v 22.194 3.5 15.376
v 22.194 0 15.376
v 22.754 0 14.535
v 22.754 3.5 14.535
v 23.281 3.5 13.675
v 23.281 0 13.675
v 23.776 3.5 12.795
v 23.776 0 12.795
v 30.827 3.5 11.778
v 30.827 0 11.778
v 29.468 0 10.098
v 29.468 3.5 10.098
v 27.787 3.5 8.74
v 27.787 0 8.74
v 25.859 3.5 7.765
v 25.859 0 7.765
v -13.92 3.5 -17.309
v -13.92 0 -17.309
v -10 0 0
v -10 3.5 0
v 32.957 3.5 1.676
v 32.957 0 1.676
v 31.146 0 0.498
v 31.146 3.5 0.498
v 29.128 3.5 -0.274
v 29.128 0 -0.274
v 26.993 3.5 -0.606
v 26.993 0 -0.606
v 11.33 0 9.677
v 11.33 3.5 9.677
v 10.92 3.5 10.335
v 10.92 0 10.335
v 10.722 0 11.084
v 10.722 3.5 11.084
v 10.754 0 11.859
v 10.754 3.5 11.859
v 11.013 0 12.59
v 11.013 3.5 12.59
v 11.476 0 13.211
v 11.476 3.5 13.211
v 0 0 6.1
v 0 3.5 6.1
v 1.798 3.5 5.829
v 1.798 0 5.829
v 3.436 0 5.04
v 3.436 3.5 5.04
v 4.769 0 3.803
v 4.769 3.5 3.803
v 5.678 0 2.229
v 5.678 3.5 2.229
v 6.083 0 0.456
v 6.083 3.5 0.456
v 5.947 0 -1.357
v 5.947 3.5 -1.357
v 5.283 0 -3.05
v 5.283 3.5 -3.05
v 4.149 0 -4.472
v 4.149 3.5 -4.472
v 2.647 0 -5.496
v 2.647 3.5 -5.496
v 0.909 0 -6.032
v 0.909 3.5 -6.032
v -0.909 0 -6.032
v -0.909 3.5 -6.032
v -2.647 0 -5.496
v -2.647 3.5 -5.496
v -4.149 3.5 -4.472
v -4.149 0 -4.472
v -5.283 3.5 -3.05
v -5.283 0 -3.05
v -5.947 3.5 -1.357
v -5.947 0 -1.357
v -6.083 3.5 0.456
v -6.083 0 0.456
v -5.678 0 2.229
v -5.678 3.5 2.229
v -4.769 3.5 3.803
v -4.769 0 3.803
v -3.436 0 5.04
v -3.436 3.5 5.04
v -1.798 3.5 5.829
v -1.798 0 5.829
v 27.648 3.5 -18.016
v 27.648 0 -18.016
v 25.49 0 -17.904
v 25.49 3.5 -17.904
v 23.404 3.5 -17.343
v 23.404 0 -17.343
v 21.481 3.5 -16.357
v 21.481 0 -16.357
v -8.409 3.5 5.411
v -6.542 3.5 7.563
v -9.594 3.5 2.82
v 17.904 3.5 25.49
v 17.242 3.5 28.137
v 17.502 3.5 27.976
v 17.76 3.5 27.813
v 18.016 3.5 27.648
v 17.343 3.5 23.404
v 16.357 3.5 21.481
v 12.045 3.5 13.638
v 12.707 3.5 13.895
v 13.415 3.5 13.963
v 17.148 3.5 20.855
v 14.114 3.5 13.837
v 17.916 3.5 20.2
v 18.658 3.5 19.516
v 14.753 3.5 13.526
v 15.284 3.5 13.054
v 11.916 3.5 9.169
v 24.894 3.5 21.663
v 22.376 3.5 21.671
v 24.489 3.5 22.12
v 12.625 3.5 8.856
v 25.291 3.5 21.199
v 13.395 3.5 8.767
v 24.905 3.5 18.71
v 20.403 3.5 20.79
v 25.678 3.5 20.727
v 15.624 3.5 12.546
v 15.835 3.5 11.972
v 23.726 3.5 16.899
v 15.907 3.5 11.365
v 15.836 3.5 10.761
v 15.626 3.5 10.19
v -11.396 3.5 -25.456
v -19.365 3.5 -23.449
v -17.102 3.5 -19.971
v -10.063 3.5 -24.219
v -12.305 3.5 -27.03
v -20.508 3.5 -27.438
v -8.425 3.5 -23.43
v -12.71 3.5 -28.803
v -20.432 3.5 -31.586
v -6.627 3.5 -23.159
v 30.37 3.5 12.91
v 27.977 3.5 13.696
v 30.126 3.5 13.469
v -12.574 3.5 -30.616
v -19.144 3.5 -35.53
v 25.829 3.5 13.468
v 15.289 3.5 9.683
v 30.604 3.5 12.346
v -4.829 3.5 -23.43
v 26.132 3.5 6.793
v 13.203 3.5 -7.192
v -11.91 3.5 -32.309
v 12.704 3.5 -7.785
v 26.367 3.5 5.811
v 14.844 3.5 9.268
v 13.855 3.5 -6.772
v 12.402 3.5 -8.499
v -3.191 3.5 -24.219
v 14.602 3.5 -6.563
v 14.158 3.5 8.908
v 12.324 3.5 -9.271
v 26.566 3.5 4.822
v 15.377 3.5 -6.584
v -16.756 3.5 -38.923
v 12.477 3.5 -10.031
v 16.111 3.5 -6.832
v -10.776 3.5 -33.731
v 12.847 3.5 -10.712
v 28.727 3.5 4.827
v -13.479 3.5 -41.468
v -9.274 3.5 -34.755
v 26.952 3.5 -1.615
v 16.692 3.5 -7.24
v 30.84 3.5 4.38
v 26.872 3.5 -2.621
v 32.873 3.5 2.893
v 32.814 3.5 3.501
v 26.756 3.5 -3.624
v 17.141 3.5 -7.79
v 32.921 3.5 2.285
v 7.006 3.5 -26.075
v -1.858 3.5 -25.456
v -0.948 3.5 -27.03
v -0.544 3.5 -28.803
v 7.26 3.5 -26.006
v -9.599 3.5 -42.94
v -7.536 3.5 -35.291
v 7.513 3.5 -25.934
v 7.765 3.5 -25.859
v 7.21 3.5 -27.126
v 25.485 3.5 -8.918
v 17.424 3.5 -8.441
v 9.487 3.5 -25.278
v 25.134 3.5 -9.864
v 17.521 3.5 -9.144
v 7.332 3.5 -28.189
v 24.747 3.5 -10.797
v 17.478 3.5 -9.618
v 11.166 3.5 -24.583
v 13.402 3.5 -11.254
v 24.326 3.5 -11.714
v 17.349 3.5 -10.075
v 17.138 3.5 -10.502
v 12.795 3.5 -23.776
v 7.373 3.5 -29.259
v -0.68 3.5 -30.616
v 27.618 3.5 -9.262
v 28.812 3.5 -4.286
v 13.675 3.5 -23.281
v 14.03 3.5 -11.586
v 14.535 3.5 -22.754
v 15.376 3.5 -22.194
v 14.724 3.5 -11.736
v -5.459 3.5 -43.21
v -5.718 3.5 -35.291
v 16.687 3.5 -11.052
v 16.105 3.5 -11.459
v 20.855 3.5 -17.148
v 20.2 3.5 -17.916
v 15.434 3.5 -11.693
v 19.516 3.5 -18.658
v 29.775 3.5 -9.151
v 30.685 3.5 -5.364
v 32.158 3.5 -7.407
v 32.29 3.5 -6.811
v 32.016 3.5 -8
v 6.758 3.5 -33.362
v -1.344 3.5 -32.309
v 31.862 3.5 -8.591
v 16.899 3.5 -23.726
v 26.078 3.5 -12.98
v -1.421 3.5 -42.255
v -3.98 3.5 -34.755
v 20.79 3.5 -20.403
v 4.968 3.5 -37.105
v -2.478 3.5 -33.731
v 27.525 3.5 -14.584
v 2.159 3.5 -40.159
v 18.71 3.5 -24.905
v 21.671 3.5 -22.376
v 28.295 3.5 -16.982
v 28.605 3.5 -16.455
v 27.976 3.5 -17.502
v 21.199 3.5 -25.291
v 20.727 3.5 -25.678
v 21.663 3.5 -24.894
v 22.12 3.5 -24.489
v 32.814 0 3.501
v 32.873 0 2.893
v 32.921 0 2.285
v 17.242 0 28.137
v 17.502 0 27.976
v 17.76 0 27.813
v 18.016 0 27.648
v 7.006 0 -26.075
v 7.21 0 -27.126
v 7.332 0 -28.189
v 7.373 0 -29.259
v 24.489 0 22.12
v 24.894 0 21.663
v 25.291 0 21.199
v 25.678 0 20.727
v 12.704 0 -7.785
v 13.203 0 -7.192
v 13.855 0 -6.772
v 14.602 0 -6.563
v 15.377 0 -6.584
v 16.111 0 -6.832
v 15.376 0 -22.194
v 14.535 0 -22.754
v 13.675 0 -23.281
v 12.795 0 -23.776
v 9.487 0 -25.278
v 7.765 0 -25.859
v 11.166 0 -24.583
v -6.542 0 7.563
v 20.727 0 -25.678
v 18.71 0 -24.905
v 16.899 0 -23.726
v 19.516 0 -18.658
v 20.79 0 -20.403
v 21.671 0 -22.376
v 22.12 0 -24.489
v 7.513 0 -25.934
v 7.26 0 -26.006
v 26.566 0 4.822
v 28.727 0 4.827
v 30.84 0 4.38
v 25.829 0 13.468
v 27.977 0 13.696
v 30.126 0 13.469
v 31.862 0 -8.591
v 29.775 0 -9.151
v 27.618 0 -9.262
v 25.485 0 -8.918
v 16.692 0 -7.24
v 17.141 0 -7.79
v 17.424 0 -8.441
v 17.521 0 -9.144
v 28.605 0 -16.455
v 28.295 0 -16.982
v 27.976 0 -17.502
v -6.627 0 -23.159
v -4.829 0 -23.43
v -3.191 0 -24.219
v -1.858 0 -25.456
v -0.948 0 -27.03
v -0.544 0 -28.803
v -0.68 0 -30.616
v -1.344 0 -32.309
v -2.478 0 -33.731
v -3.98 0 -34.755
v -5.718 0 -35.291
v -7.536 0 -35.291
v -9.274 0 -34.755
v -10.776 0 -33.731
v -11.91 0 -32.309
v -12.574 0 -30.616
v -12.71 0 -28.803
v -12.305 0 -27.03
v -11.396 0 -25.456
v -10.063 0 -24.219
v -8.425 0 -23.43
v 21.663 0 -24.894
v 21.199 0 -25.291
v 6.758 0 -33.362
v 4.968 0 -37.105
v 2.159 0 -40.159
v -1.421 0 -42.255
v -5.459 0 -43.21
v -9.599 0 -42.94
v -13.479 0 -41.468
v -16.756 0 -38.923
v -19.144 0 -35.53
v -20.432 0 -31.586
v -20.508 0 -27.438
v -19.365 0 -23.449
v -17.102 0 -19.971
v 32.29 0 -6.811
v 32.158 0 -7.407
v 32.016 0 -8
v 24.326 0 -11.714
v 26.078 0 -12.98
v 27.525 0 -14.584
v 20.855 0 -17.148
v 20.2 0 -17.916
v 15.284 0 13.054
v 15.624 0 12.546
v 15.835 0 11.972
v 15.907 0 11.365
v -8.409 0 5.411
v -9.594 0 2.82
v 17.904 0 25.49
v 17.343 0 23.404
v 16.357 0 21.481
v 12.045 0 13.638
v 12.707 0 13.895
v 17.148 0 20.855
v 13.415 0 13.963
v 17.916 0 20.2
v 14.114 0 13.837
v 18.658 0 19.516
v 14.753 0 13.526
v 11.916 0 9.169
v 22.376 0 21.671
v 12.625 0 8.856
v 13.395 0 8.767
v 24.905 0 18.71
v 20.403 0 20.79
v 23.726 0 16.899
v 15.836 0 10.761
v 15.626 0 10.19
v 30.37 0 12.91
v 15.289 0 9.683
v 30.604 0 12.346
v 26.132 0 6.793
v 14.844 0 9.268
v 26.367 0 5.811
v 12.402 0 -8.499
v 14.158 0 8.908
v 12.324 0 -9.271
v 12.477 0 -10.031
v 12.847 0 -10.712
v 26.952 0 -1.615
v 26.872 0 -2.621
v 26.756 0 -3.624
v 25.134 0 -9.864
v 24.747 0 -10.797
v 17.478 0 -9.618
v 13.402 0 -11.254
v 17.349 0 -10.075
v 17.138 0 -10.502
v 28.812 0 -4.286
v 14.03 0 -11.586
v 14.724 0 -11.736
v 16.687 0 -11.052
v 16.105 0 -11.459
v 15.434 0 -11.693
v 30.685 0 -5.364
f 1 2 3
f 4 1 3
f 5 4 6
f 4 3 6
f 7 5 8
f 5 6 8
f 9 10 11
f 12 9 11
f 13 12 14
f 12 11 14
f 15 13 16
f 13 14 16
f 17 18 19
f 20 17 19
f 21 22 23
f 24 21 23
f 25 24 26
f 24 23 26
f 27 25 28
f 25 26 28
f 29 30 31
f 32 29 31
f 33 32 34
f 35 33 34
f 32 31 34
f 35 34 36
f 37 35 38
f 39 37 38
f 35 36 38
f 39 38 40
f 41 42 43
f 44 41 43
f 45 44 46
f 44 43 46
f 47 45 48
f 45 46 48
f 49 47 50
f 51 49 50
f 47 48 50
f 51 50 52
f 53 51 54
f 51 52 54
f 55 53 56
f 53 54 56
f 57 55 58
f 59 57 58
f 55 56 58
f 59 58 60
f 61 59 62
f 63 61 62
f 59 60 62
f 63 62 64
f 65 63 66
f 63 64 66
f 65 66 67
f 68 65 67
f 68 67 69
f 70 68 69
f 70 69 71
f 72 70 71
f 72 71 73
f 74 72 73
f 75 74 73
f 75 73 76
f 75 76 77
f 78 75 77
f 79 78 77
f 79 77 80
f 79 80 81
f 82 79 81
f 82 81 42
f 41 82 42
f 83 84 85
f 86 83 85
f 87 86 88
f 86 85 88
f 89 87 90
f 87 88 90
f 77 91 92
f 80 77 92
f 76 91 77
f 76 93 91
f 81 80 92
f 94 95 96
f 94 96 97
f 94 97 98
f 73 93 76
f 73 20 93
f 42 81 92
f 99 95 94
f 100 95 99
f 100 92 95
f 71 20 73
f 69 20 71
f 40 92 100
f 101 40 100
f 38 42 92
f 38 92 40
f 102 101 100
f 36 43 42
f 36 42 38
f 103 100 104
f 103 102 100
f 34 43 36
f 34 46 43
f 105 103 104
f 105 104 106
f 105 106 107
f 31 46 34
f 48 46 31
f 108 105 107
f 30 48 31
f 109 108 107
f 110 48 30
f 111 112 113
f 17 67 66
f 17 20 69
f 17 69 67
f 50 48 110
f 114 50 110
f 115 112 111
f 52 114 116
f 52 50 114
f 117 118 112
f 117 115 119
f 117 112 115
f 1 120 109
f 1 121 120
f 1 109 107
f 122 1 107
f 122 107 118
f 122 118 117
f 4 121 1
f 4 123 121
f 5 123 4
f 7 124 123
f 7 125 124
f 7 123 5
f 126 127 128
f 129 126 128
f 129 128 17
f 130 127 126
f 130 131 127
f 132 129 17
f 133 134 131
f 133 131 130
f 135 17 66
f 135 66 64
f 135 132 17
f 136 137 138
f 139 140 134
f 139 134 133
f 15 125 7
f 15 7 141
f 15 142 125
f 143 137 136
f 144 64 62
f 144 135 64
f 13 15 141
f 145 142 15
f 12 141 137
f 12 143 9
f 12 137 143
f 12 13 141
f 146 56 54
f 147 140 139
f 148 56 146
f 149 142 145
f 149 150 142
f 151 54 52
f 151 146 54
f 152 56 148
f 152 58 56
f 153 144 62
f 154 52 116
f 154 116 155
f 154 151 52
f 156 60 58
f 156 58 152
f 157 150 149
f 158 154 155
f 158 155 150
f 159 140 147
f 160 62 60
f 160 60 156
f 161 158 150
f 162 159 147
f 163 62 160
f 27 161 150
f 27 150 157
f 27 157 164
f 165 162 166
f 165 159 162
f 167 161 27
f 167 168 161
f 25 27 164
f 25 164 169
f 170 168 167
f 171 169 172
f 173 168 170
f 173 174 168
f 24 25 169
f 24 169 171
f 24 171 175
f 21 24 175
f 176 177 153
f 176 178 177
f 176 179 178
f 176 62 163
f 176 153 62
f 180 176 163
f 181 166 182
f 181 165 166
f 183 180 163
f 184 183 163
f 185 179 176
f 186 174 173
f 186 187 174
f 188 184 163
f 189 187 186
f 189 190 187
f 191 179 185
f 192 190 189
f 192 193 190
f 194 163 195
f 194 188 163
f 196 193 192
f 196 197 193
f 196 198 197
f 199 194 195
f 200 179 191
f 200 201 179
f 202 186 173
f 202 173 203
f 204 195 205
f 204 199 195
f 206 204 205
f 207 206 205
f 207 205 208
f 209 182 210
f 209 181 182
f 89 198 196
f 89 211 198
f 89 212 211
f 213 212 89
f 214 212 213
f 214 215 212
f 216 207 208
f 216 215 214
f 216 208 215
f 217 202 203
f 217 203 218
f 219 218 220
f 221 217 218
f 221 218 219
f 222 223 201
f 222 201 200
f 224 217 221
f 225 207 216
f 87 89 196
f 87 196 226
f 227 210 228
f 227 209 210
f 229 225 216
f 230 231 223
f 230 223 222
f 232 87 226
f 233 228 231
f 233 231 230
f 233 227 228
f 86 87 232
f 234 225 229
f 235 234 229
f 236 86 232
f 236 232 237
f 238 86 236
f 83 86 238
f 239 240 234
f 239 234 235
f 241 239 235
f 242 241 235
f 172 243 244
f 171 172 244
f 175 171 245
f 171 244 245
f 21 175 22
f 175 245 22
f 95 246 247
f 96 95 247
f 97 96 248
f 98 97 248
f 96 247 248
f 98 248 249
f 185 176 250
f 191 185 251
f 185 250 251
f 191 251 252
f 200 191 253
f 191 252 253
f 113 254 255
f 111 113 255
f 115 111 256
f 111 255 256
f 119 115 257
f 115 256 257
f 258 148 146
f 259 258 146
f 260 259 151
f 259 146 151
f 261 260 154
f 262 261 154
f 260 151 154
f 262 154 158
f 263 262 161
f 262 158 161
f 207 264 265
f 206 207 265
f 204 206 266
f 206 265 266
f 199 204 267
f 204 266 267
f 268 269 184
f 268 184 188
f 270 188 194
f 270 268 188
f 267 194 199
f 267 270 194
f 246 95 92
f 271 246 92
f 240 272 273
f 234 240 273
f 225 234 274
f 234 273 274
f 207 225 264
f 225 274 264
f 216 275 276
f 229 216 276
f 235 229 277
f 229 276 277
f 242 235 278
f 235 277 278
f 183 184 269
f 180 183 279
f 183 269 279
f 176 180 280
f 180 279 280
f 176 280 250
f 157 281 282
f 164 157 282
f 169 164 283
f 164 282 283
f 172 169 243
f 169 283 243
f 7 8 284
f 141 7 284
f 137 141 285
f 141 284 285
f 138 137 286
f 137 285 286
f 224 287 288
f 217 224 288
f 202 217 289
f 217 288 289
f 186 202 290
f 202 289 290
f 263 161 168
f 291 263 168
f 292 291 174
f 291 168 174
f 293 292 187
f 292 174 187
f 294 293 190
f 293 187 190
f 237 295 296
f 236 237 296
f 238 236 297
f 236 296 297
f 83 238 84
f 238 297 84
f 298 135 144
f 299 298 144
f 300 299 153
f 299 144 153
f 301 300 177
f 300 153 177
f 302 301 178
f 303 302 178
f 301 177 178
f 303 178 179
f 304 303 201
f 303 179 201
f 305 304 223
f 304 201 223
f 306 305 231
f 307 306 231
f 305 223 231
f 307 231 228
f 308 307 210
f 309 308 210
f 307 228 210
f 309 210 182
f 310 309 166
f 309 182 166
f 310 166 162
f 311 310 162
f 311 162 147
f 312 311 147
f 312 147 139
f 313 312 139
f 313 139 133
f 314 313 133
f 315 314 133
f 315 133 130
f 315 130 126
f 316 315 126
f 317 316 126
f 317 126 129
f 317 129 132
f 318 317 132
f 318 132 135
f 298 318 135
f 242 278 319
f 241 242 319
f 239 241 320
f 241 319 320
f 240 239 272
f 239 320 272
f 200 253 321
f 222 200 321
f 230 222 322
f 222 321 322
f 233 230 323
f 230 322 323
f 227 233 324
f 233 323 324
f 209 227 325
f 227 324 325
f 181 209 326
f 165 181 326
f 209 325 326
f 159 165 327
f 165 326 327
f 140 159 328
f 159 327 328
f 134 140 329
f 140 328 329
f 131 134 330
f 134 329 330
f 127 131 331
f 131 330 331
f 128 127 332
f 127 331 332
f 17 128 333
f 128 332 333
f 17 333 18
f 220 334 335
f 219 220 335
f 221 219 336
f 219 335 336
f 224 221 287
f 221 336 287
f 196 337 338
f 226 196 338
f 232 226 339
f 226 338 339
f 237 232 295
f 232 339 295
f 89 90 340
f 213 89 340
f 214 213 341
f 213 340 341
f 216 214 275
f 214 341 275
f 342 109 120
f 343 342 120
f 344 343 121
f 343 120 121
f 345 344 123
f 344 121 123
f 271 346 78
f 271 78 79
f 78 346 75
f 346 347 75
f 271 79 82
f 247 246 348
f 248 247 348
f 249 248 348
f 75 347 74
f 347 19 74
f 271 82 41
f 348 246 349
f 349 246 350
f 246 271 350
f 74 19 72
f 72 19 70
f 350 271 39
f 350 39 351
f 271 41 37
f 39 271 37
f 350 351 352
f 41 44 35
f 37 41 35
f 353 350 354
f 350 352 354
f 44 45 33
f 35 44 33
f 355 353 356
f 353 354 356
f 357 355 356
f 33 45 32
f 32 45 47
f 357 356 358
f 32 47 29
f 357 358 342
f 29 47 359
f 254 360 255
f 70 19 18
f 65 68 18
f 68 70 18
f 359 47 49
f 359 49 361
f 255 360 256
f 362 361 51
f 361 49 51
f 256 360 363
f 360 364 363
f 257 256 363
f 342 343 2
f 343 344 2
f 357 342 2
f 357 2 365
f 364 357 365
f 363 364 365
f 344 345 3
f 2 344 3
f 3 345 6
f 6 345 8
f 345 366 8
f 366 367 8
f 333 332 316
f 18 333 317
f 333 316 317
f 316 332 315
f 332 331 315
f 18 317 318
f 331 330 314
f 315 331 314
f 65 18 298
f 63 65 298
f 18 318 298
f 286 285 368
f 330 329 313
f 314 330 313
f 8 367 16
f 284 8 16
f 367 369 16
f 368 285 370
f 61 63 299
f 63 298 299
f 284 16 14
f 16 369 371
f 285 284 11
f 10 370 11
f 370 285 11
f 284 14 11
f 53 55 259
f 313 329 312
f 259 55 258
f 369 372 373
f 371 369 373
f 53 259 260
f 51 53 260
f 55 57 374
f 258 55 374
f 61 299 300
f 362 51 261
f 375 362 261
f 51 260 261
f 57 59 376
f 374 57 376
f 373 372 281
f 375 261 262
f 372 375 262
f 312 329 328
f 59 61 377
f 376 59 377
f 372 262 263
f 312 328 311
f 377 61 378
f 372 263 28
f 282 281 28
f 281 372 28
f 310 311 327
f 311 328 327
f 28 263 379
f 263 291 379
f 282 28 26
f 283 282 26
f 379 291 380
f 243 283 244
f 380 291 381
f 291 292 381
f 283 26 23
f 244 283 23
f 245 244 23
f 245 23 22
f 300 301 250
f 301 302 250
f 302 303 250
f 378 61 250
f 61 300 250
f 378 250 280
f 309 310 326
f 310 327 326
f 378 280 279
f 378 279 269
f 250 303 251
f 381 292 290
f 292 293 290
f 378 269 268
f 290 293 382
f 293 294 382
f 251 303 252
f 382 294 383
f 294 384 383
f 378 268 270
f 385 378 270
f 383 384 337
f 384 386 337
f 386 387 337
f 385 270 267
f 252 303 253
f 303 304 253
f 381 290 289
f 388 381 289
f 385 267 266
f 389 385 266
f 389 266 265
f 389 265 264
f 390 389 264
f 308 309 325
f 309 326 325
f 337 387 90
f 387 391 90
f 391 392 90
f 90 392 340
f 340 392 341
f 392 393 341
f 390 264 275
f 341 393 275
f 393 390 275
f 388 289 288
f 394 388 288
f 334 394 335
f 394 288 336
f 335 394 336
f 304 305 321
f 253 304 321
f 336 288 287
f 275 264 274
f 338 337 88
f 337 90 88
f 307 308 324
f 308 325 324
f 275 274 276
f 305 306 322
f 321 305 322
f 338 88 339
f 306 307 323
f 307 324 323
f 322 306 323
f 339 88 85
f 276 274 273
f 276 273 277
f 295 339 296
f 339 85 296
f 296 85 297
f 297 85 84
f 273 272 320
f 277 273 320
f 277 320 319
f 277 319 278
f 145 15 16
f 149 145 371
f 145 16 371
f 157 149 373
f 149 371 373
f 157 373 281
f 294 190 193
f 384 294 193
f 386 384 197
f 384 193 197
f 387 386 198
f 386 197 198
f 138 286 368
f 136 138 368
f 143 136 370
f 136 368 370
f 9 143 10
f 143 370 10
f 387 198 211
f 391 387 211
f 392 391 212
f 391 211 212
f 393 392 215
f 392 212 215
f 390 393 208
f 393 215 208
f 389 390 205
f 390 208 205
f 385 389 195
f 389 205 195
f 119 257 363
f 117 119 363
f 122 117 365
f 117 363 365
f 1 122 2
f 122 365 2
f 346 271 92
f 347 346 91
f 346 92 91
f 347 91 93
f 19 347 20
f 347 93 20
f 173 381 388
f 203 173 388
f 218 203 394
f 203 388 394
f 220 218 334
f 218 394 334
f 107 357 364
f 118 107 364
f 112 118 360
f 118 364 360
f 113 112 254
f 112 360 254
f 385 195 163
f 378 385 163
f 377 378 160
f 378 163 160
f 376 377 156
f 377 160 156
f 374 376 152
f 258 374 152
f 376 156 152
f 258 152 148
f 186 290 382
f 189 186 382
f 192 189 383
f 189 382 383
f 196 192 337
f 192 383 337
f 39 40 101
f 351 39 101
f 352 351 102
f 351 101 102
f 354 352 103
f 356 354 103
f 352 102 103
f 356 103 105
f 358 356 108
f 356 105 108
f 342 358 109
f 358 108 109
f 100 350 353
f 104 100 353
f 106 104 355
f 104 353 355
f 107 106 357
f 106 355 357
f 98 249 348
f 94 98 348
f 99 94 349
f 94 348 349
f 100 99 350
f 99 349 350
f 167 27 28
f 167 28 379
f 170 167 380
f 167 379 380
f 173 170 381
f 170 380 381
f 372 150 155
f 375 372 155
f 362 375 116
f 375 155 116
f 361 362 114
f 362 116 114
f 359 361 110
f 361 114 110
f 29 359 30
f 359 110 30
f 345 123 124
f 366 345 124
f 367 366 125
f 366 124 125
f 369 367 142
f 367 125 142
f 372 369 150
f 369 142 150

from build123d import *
from build123d.topology import SkipClean

# Parameters (mm, degrees)
SKETCH_1_R           = 27
EXTRUDE_2_DEPTH      = 10
EXTRUDE_START        = -10
EXTRUDE_3_DEPTH      = 10
CUT_EXTRUDE_2_DEPTH  = 48.669538272
SKETCH_6_R           = 6.1
CUT_EXTRUDE_3_DEPTH  = 10
EXTRUDE_5_DEPTH      = 10
SKETCH_10_R          = 6.1
CUT_EXTRUDE_5_DEPTH  = 10
CUT_EXTRUDE_START    = -10
CUT_EXTRUDE_6_DEPTH  = 10
FILLET_1_R           = 10
EXTRUDE_7_DEPTH      = 10
CUT_EXTRUDE_START_2  = -6.5
CUT_EXTRUDE_8_DEPTH  = 6.5
CUT_EXTRUDE_9_DEPTH  = 10
CUT_EXTRUDE_10_DEPTH = 10


with BuildPart() as part:
    # 草图1 → 凸台-拉伸2 (new body)
    with BuildSketch(Plane(origin=(0, 0, 0), x_dir=(1, 0, 0), z_dir=(0, 1, 0))):
        with Locations(Location((0, 0, 0), (0, 0, 270))):
            Circle(SKETCH_1_R)
    extrude(amount=EXTRUDE_2_DEPTH)

    # 草图3 → 凸台-拉伸3 (add)
    with BuildSketch(Plane(origin=(0, 10, 0), x_dir=(1, 0, 0), z_dir=(0, 1, 0)).offset(EXTRUDE_START)):
        with BuildLine():
            ThreePointArc((-3.623654542, 26.755730746), (-4.775668185, 29.776890365), (-6.810627033, 32.289554959))
            ThreePointArc((-6.810627033, 32.289554959), (-7.703697007, 32.088207373), (-8.590838072, 31.862164101))
            ThreePointArc((-8.590838072, 31.862164101), (-9.263273827, 28.699511571), (-8.918147734, 25.484635391))
            ThreePointArc((-8.918147734, 25.484635391), (-6.303024824, 26.253987851), (-3.623654542, 26.755730746))
        make_face()
        with BuildLine():
            ThreePointArc((-11.714275763, 24.326441239), (-13.743495509, 26.843742988), (-16.455312443, 28.604592156))
            ThreePointArc((-16.455312443, 28.604592156), (-17.242452636, 28.137125424), (-18.016322714, 27.648003832))
            ThreePointArc((-18.016322714, 27.648003832), (-17.678533741, 24.432348458), (-16.356847947, 21.481469346))
            ThreePointArc((-16.356847947, 21.481469346), (-14.107461247, 23.021284438), (-11.714275763, 24.326441239))
        make_face()
        with BuildLine():
            ThreePointArc((-18.658222053, 19.515910171), (-21.366013737, 21.282943016), (-24.48923722, 22.119612574))
            ThreePointArc((-24.48923722, 22.119612574), (-25.093396865, 21.431785595), (-25.678244161, 20.727464312))
            ThreePointArc((-25.678244161, 20.727464312), (-24.363295599, 17.773576848), (-22.194425918, 15.375547411))
            ThreePointArc((-22.194425918, 15.375547411), (-20.530961071, 17.535097305), (-18.658222053, 19.515910171))
        make_face()
        with BuildLine():
            ThreePointArc((-23.77577157, 12.79502584), (-26.897077674, 13.638820294), (-30.125984831, 13.469411196))
            ThreePointArc((-30.125984831, 13.469411196), (-30.488024573, 12.628553268), (-30.826600159, 11.777976169))
            ThreePointArc((-30.826600159, 11.777976169), (-28.663208335, 9.3750037), (-25.859458842, 7.764559768))
            ThreePointArc((-25.859458842, 7.764559768), (-24.944747378, 10.332452674), (-23.77577157, 12.79502584))
        make_face()
        with BuildLine():
            ThreePointArc((-26.56598291, 4.821675232), (-29.795268245, 4.659634815), (-32.813791147, 3.500730003))
            ThreePointArc((-32.813791147, 3.500730003), (-32.898272013, 2.589150159), (-32.957433752, 1.675577656))
            ThreePointArc((-32.957433752, 1.675577656), (-30.15736653, 0.05873987), (-26.993187762, -0.606477084))
            ThreePointArc((-26.993187762, -0.606477084), (-26.916768011, 2.118395585), (-26.56598291, 4.821675232))
        make_face()
        with BuildLine():
            ThreePointArc((-32.289554959, -6.810627033), (-32.088207373, -7.703697007), (-31.862164101, -8.590838072))
            ThreePointArc((-31.862164101, -8.590838072), (-28.699511571, -9.263273827), (-25.484635391, -8.918147734))
            ThreePointArc((-25.484635391, -8.918147734), (-26.253987851, -6.303024824), (-26.755730746, -3.623654542))
            ThreePointArc((-26.755730746, -3.623654542), (-29.776890365, -4.775668185), (-32.289554959, -6.810627033))
        make_face()
        with BuildLine():
            ThreePointArc((-28.604592156, -16.455312443), (-28.137125424, -17.242452636), (-27.648003832, -18.016322714))
            ThreePointArc((-27.648003832, -18.016322714), (-24.432348458, -17.678533741), (-21.481469346, -16.356847947))
            ThreePointArc((-21.481469346, -16.356847947), (-23.021284438, -14.107461247), (-24.326441239, -11.714275763))
            ThreePointArc((-24.326441239, -11.714275763), (-26.843742988, -13.743495509), (-28.604592156, -16.455312443))
        make_face()
        with BuildLine():
            ThreePointArc((-22.119612574, -24.48923722), (-21.431785595, -25.093396865), (-20.727464312, -25.678244161))
            ThreePointArc((-20.727464312, -25.678244161), (-17.773576848, -24.363295599), (-15.375547411, -22.194425918))
            ThreePointArc((-15.375547411, -22.194425918), (-17.535097305, -20.530961071), (-19.515910171, -18.658222053))
            ThreePointArc((-19.515910171, -18.658222053), (-21.282943016, -21.366013737), (-22.119612574, -24.48923722))
        make_face()
        with BuildLine():
            ThreePointArc((-13.469411196, -30.125984831), (-12.628553268, -30.488024573), (-11.777976169, -30.826600159))
            ThreePointArc((-11.777976169, -30.826600159), (-9.3750037, -28.663208335), (-7.764559768, -25.859458842))
            ThreePointArc((-7.764559768, -25.859458842), (-10.332452674, -24.944747378), (-12.79502584, -23.77577157))
            ThreePointArc((-12.79502584, -23.77577157), (-13.638820294, -26.897077674), (-13.469411196, -30.125984831))
        make_face()
        with BuildLine():
            ThreePointArc((-3.500730003, -32.813791147), (-2.589150159, -32.898272013), (-1.675577656, -32.957433752))
            ThreePointArc((-1.675577656, -32.957433752), (-0.05873987, -30.15736653), (0.606477084, -26.993187762))
            ThreePointArc((0.606477084, -26.993187762), (-2.118395585, -26.916768011), (-4.821675232, -26.56598291))
            ThreePointArc((-4.821675232, -26.56598291), (-4.659634815, -29.795268245), (-3.500730003, -32.813791147))
        make_face()
        with BuildLine():
            ThreePointArc((6.810627033, -32.289554959), (7.703697007, -32.088207373), (8.590838072, -31.862164101))
            ThreePointArc((8.590838072, -31.862164101), (9.263273827, -28.699511571), (8.918147734, -25.484635391))
            ThreePointArc((8.918147734, -25.484635391), (6.303024824, -26.253987851), (3.623654542, -26.755730746))
            ThreePointArc((3.623654542, -26.755730746), (4.775668185, -29.776890365), (6.810627033, -32.289554959))
        make_face()
        with BuildLine():
            ThreePointArc((16.455312443, -28.604592156), (17.242452636, -28.137125424), (18.016322714, -27.648003832))
            ThreePointArc((18.016322714, -27.648003832), (17.678533741, -24.432348458), (16.356847947, -21.481469346))
            ThreePointArc((16.356847947, -21.481469346), (14.107461247, -23.021284438), (11.714275763, -24.326441239))
            ThreePointArc((11.714275763, -24.326441239), (13.743495509, -26.843742988), (16.455312443, -28.604592156))
        make_face()
        with BuildLine():
            ThreePointArc((24.48923722, -22.119612574), (25.093396865, -21.431785595), (25.678244161, -20.727464312))
            ThreePointArc((25.678244161, -20.727464312), (24.363295599, -17.773576848), (22.194425918, -15.375547411))
            ThreePointArc((22.194425918, -15.375547411), (20.530961071, -17.535097305), (18.658222053, -19.515910171))
            ThreePointArc((18.658222053, -19.515910171), (21.366013737, -21.282943016), (24.48923722, -22.119612574))
        make_face()
        with BuildLine():
            ThreePointArc((30.125984831, -13.469411196), (30.488024573, -12.628553268), (30.826600159, -11.777976169))
            ThreePointArc((30.826600159, -11.777976169), (28.663208335, -9.3750037), (25.859458842, -7.764559768))
            ThreePointArc((25.859458842, -7.764559768), (24.944747378, -10.332452674), (23.77577157, -12.79502584))
            ThreePointArc((23.77577157, -12.79502584), (26.897077674, -13.638820294), (30.125984831, -13.469411196))
        make_face()
        with BuildLine():
            ThreePointArc((32.813791147, -3.500730003), (32.898272013, -2.589150159), (32.957433752, -1.675577656))
            ThreePointArc((32.957433752, -1.675577656), (30.15736653, -0.05873987), (26.993187762, 0.606477084))
            ThreePointArc((26.993187762, 0.606477084), (26.998296887, 0.303257671), (27, 0))
            ThreePointArc((27, 0), (26.891276825, -2.420584789), (26.56598291, -4.821675232))
            ThreePointArc((26.56598291, -4.821675232), (29.795268245, -4.659634815), (32.813791147, -3.500730003))
        make_face()
        with BuildLine():
            ThreePointArc((26.755730746, 3.623654542), (29.776890365, 4.775668185), (32.289554959, 6.810627033))
            ThreePointArc((32.289554959, 6.810627033), (32.088207373, 7.703697007), (31.862164101, 8.590838072))
            ThreePointArc((31.862164101, 8.590838072), (28.699511571, 9.263273827), (25.484635391, 8.918147734))
            ThreePointArc((25.484635391, 8.918147734), (26.253987851, 6.303024824), (26.755730746, 3.623654542))
        make_face()
        with BuildLine():
            ThreePointArc((24.326441239, 11.714275763), (26.843742988, 13.743495509), (28.604592156, 16.455312443))
            ThreePointArc((28.604592156, 16.455312443), (28.137125424, 17.242452636), (27.648003832, 18.016322714))
            ThreePointArc((27.648003832, 18.016322714), (24.432348458, 17.678533741), (21.481469346, 16.356847947))
            ThreePointArc((21.481469346, 16.356847947), (23.021284438, 14.107461247), (24.326441239, 11.714275763))
        make_face()
        with BuildLine():
            ThreePointArc((19.515910171, 18.658222053), (21.282943016, 21.366013737), (22.119612574, 24.48923722))
            ThreePointArc((22.119612574, 24.48923722), (21.431785595, 25.093396865), (20.727464312, 25.678244161))
            ThreePointArc((20.727464312, 25.678244161), (17.773576848, 24.363295599), (15.375547411, 22.194425918))
            ThreePointArc((15.375547411, 22.194425918), (17.535097305, 20.530961071), (19.515910171, 18.658222053))
        make_face()
        with BuildLine():
            ThreePointArc((12.79502584, 23.77577157), (13.638820294, 26.897077674), (13.469411196, 30.125984831))
            ThreePointArc((13.469411196, 30.125984831), (12.628553268, 30.488024573), (11.777976169, 30.826600159))
            ThreePointArc((11.777976169, 30.826600159), (9.3750037, 28.663208335), (7.764559768, 25.859458842))
            ThreePointArc((7.764559768, 25.859458842), (10.332452674, 24.944747378), (12.79502584, 23.77577157))
        make_face()
        with BuildLine():
            ThreePointArc((4.821675232, 26.56598291), (4.659634815, 29.795268245), (3.500730003, 32.813791147))
            ThreePointArc((3.500730003, 32.813791147), (2.589150159, 32.898272013), (1.675577656, 32.957433752))
            ThreePointArc((1.675577656, 32.957433752), (0.05873987, 30.15736653), (-0.606477084, 26.993187762))
            ThreePointArc((-0.606477084, 26.993187762), (2.118395585, 26.916768011), (4.821675232, 26.56598291))
        make_face()
    extrude(amount=EXTRUDE_3_DEPTH)

    # 草图4 → 切除-拉伸2 (cut, through all)
    with BuildSketch(Plane(origin=(0, 10, 0), x_dir=(1, 0, 0), z_dir=(0, 1, 0))):
        with BuildLine():
            Line((68.70942434, -72.656830422), (-6.542169106, -7.563069707))
            ThreePointArc((-6.542169106, -7.563069707), (-9.614988938, -2.748088014), (-9.550796477, 2.963492306))
            Line((-9.550796477, 2.963492306), (-2.118395585, 26.916768011))
            Line((-2.118395585, 26.916768011), (19.935579671, 97.992717399))
            ThreePointArc((19.935579671, 97.992717399), (-96.149889375, -27.480880138), (68.70942434, -72.656830422))
        make_face()
    extrude(amount=-CUT_EXTRUDE_2_DEPTH, mode=Mode.SUBTRACT)

    # 草图6 → 切除-拉伸3 (cut)
    with BuildSketch(Plane(origin=(0, 10, 0), x_dir=(1, 0, 0), z_dir=(0, 1, 0))):
        with Locations(Location((0, 0, 0), (0, 0, 270))):
            Circle(SKETCH_6_R)
    extrude(amount=-CUT_EXTRUDE_3_DEPTH, mode=Mode.SUBTRACT)

    # 草图9 → 凸台-拉伸5 (add)
    with BuildSketch(Plane(origin=(0, 10, 0), x_dir=(1, 0, 0), z_dir=(0, 1, 0)).offset(EXTRUDE_START)):
        with BuildLine():
            Line((-18.337271569, 36.810995995), (-10, 0))
            ThreePointArc((-10, 0), (-9.887061363, 1.49867195), (-9.550796477, 2.963492306))
            Line((-9.550796477, 2.963492306), (-2.118395585, 26.916768011))
            ThreePointArc((-2.118395585, 26.916768011), (-1.362972032, 26.965576338), (-0.606477084, 26.993187762))
            ThreePointArc((-0.606477084, 26.993187762), (0.05873987, 30.15736653), (1.675577656, 32.957433752))
            ThreePointArc((1.675577656, 32.957433752), (2.589150159, 32.898272013), (3.500730003, 32.813791147))
            ThreePointArc((3.500730003, 32.813791147), (4.659634815, 29.795268245), (4.821675232, 26.56598291))
            Line((4.821675232, 26.56598291), (7.168022985, 33.612773021))
            ThreePointArc((7.168022985, 33.612773021), (-5.303969741, 37.450057719), (-18.337271569, 36.810995995))
        make_face()
    extrude(amount=EXTRUDE_5_DEPTH)

    # 草图10 → 切除-拉伸5 (cut)
    with BuildSketch(Plane(origin=(0, 10, 0), x_dir=(1, 0, 0), z_dir=(0, 1, 0))):
        with Locations(Location((-6.626815852, 29.258935587, 0), (0, 0, 270))):
            Circle(SKETCH_10_R)
    extrude(amount=-CUT_EXTRUDE_5_DEPTH, mode=Mode.SUBTRACT)

    # 草图11 → 切除-拉伸6 (cut)
    with BuildSketch(Plane(origin=(0, 10, 0), x_dir=(1, 0, 0), z_dir=(0, 1, 0)).offset(CUT_EXTRUDE_START)):
        with BuildLine():
            Line((0, 36.394498532), (3.500730003, 32.813791147))
            ThreePointArc((3.500730003, 32.813791147), (4.659634815, 29.795268245), (4.821675232, 26.56598291))
            Line((4.821675232, 26.56598291), (7.168022985, 33.612773021))
            ThreePointArc((7.168022985, 33.612773021), (3.655030847, 35.186640305), (0, 36.394498532))
        make_face()
    extrude(amount=CUT_EXTRUDE_6_DEPTH, mode=Mode.SUBTRACT)

    # 圆角1
    fillet_1_edges = [part.edges().sort_by_distance(p)[0] for p in [
        (-18.337271569, 5, -36.810995995),
    ]]
    fillet(fillet_1_edges, radius=FILLET_1_R)

    # 草图16 → 凸台-拉伸7 (add)
    with BuildSketch(Plane(origin=(0, 10, 0), x_dir=(1, 0, 0), z_dir=(0, 1, 0)).offset(EXTRUDE_START)):
        with BuildLine():
            Line((-13.920244702, 17.308793512), (-15.716384779, 25.239170332))
            ThreePointArc((-15.716384779, 25.239170332), (-13.300434171, 34.242814336), (-4.508428545, 37.341694744))
            ThreePointArc((-4.508428545, 37.341694744), (-2.23974925, 36.936946702), (0, 36.394498532))
            Line((0, 36.394498532), (3.500730003, 32.813791147))
            ThreePointArc((3.500730003, 32.813791147), (4.659634815, 29.795268245), (4.821675232, 26.56598291))
            ThreePointArc((4.821675232, 26.56598291), (5.919103569, 26.343200507), (7.006350229, 26.075104151))
            ThreePointArc((7.006350229, 26.075104151), (7.281173311, 27.65648826), (7.373184148, 29.258935587))
            ThreePointArc((7.373184148, 29.258935587), (-13.478530824, 41.467703008), (-13.920244702, 17.308793512))
        make_face()
    extrude(amount=EXTRUDE_7_DEPTH)

    # 草图17 → 切除-拉伸8 (cut)
    with BuildSketch(Plane(origin=(0, 10, 0), x_dir=(1, 0, 0), z_dir=(0, 1, 0)).offset(CUT_EXTRUDE_START_2)):
        with BuildLine():
            Line((-13.920244702, 17.308793512), (-10, 0))
            ThreePointArc((-10, 0), (-9.09455032, -4.158022904), (-6.542169106, -7.563069707))
            Line((-6.542169106, -7.563069707), (17.242452636, -28.137125424))
            ThreePointArc((17.242452636, -28.137125424), (17.631083908, -27.895248345), (18.016322714, -27.648003832))
            ThreePointArc((18.016322714, -27.648003832), (17.678533741, -24.432348458), (16.356847947, -21.481469346))
            ThreePointArc((16.356847947, -21.481469346), (17.535097305, -20.530961071), (18.658222053, -19.515910171))
            ThreePointArc((18.658222053, -19.515910171), (21.366013737, -21.282943016), (24.48923722, -22.119612574))
            ThreePointArc((24.48923722, -22.119612574), (25.093396865, -21.431785595), (25.678244161, -20.727464312))
            ThreePointArc((25.678244161, -20.727464312), (24.363295599, -17.773576848), (22.194425918, -15.375547411))
            ThreePointArc((22.194425918, -15.375547411), (23.021284438, -14.107461247), (23.77577157, -12.79502584))
            ThreePointArc((23.77577157, -12.79502584), (26.897077674, -13.638820294), (30.125984831, -13.469411196))
            ThreePointArc((30.125984831, -13.469411196), (30.488024573, -12.628553268), (30.826600159, -11.777976169))
            ThreePointArc((30.826600159, -11.777976169), (28.663208335, -9.3750037), (25.859458842, -7.764559768))
            ThreePointArc((25.859458842, -7.764559768), (26.253987851, -6.303024824), (26.56598291, -4.821675232))
            ThreePointArc((26.56598291, -4.821675232), (29.795268245, -4.659634815), (32.813791147, -3.500730003))
            ThreePointArc((32.813791147, -3.500730003), (32.898272013, -2.589150159), (32.957433752, -1.675577656))
            ThreePointArc((32.957433752, -1.675577656), (30.15736653, -0.05873987), (26.993187762, 0.606477084))
            ThreePointArc((26.993187762, 0.606477084), (26.916768011, 2.118395585), (26.755730746, 3.623654542))
            ThreePointArc((26.755730746, 3.623654542), (29.776890365, 4.775668185), (32.289554959, 6.810627033))
            ThreePointArc((32.289554959, 6.810627033), (32.088207373, 7.703697007), (31.862164101, 8.590838072))
            ThreePointArc((31.862164101, 8.590838072), (28.699511571, 9.263273827), (25.484635391, 8.918147734))
            ThreePointArc((25.484635391, 8.918147734), (24.944747378, 10.332452674), (24.326441239, 11.714275763))
            ThreePointArc((24.326441239, 11.714275763), (26.843742988, 13.743495509), (28.604592156, 16.455312443))
            ThreePointArc((28.604592156, 16.455312443), (28.137125424, 17.242452636), (27.648003832, 18.016322714))
            ThreePointArc((27.648003832, 18.016322714), (24.432348458, 17.678533741), (21.481469346, 16.356847947))
            ThreePointArc((21.481469346, 16.356847947), (20.530961071, 17.535097305), (19.515910171, 18.658222053))
            ThreePointArc((19.515910171, 18.658222053), (21.282943016, 21.366013737), (22.119612574, 24.48923722))
            ThreePointArc((22.119612574, 24.48923722), (21.431785595, 25.093396865), (20.727464312, 25.678244161))
            ThreePointArc((20.727464312, 25.678244161), (17.773576848, 24.363295599), (15.375547411, 22.194425918))
            ThreePointArc((15.375547411, 22.194425918), (14.107461247, 23.021284438), (12.79502584, 23.77577157))
            ThreePointArc((12.79502584, 23.77577157), (13.638820294, 26.897077674), (13.469411196, 30.125984831))
            ThreePointArc((13.469411196, 30.125984831), (12.628553268, 30.488024573), (11.777976169, 30.826600159))
            ThreePointArc((11.777976169, 30.826600159), (9.3750037, 28.663208335), (7.764559768, 25.859458842))
            ThreePointArc((7.764559768, 25.859458842), (7.386242025, 25.970048686), (7.006350229, 26.075104151))
            ThreePointArc((7.006350229, 26.075104151), (-12.036078056, 42.171715396), (-13.920244702, 17.308793512))
        make_face()
    extrude(amount=CUT_EXTRUDE_8_DEPTH, mode=Mode.SUBTRACT)

    # 草图19 → 切除-拉伸9 (cut)
    with BuildSketch(Plane(origin=(0, 3.5, 0), x_dir=(1, 0, 0), z_dir=(0, 1, 0))):
        with BuildLine():
            ThreePointArc((17.521202876, 9.143724883), (17.423586491, 9.849470052), (17.138067304, 10.502221151))
            Line((17.138067304, 10.502221151), (14.921202876, 9.143724883))
            ThreePointArc((14.921202876, 9.143724883), (15.559223715, 8.01002855), (16.111264261, 6.832068788))
            ThreePointArc((16.111264261, 6.832068788), (17.140905514, 7.78987105), (17.521202876, 9.143724883))
        make_face()
        with BuildLine():
            Line((14.921202876, 9.143724883), (17.138067304, 10.502221151))
            ThreePointArc((17.138067304, 10.502221151), (15.433773338, 11.692699485), (13.401778777, 11.253547246))
            ThreePointArc((13.401778777, 11.253547246), (14.200727447, 10.226892977), (14.921202876, 9.143724883))
        make_face()
        with BuildLine():
            ThreePointArc((16.111264261, 6.832068788), (15.559223715, 8.01002855), (14.921202876, 9.143724883))
            Line((14.921202876, 9.143724883), (12.704338449, 7.785228614))
            ThreePointArc((12.704338449, 7.785228614), (14.220696248, 6.639869762), (16.111264261, 6.832068788))
        make_face()
        with BuildLine():
            Line((12.704338449, 7.785228614), (14.921202876, 9.143724883))
            ThreePointArc((14.921202876, 9.143724883), (14.200727447, 10.226892977), (13.401778777, 11.253547246))
            ThreePointArc((13.401778777, 11.253547246), (12.372228274, 9.656295344), (12.704338449, 7.785228614))
        make_face()
        with BuildLine():
            ThreePointArc((11.330048887, -9.67677592), (10.709328217, -11.472853236), (11.476337998, -13.211497499))
            ThreePointArc((11.476337998, -13.211497499), (12.426054396, -12.322466156), (13.307104398, -11.365340846))
            Line((13.307104398, -11.365340846), (11.330048887, -9.67677592))
        make_face()
        with BuildLine():
            ThreePointArc((13.307104398, -11.365340846), (12.426054396, -12.322466156), (11.476337998, -13.211497499))
            ThreePointArc((11.476337998, -13.211497499), (13.414616788, -13.963117027), (15.284159909, -13.053905771))
            Line((15.284159909, -13.053905771), (13.307104398, -11.365340846))
        make_face()
        with BuildLine():
            ThreePointArc((14.844136837, -9.268311689), (13.006911405, -8.782728957), (11.330048887, -9.67677592))
            Line((11.330048887, -9.67677592), (13.307104398, -11.365340846))
            ThreePointArc((13.307104398, -11.365340846), (14.114619321, -10.345410645), (14.844136837, -9.268311689))
        make_face()
        with BuildLine():
            ThreePointArc((15.907104398, -11.365340846), (15.626186581, -10.189816354), (14.844136837, -9.268311689))
            ThreePointArc((14.844136837, -9.268311689), (14.114619321, -10.345410645), (13.307104398, -11.365340846))
            Line((13.307104398, -11.365340846), (15.284159909, -13.053905771))
            ThreePointArc((15.284159909, -13.053905771), (15.746401871, -12.265245194), (15.907104398, -11.365340846))
        make_face()
    extrude(amount=-CUT_EXTRUDE_9_DEPTH, mode=Mode.SUBTRACT)

    # 草图20 → 切除-拉伸10 (cut)
    with SkipClean():  # the faces are left unmerged after this step: merging them gives an invalid solid
        with BuildSketch(Plane(origin=(0, 3.5, 0), x_dir=(1, 0, 0), z_dir=(0, 1, 0)).offset(CUT_EXTRUDE_START)):
            with BuildLine():
                ThreePointArc((11.777976169, 30.826600159), (9.3750037, 28.663208335), (7.764559768, 25.859458842))
                ThreePointArc((7.764559768, 25.859458842), (10.332452674, 24.944747378), (12.79502584, 23.77577157))
                ThreePointArc((12.79502584, 23.77577157), (13.638820294, 26.897077674), (13.469411196, 30.125984831))
                ThreePointArc((13.469411196, 30.125984831), (12.628553268, 30.488024573), (11.777976169, 30.826600159))
            make_face()
        extrude(amount=CUT_EXTRUDE_10_DEPTH, mode=Mode.SUBTRACT)


solid = part.part
